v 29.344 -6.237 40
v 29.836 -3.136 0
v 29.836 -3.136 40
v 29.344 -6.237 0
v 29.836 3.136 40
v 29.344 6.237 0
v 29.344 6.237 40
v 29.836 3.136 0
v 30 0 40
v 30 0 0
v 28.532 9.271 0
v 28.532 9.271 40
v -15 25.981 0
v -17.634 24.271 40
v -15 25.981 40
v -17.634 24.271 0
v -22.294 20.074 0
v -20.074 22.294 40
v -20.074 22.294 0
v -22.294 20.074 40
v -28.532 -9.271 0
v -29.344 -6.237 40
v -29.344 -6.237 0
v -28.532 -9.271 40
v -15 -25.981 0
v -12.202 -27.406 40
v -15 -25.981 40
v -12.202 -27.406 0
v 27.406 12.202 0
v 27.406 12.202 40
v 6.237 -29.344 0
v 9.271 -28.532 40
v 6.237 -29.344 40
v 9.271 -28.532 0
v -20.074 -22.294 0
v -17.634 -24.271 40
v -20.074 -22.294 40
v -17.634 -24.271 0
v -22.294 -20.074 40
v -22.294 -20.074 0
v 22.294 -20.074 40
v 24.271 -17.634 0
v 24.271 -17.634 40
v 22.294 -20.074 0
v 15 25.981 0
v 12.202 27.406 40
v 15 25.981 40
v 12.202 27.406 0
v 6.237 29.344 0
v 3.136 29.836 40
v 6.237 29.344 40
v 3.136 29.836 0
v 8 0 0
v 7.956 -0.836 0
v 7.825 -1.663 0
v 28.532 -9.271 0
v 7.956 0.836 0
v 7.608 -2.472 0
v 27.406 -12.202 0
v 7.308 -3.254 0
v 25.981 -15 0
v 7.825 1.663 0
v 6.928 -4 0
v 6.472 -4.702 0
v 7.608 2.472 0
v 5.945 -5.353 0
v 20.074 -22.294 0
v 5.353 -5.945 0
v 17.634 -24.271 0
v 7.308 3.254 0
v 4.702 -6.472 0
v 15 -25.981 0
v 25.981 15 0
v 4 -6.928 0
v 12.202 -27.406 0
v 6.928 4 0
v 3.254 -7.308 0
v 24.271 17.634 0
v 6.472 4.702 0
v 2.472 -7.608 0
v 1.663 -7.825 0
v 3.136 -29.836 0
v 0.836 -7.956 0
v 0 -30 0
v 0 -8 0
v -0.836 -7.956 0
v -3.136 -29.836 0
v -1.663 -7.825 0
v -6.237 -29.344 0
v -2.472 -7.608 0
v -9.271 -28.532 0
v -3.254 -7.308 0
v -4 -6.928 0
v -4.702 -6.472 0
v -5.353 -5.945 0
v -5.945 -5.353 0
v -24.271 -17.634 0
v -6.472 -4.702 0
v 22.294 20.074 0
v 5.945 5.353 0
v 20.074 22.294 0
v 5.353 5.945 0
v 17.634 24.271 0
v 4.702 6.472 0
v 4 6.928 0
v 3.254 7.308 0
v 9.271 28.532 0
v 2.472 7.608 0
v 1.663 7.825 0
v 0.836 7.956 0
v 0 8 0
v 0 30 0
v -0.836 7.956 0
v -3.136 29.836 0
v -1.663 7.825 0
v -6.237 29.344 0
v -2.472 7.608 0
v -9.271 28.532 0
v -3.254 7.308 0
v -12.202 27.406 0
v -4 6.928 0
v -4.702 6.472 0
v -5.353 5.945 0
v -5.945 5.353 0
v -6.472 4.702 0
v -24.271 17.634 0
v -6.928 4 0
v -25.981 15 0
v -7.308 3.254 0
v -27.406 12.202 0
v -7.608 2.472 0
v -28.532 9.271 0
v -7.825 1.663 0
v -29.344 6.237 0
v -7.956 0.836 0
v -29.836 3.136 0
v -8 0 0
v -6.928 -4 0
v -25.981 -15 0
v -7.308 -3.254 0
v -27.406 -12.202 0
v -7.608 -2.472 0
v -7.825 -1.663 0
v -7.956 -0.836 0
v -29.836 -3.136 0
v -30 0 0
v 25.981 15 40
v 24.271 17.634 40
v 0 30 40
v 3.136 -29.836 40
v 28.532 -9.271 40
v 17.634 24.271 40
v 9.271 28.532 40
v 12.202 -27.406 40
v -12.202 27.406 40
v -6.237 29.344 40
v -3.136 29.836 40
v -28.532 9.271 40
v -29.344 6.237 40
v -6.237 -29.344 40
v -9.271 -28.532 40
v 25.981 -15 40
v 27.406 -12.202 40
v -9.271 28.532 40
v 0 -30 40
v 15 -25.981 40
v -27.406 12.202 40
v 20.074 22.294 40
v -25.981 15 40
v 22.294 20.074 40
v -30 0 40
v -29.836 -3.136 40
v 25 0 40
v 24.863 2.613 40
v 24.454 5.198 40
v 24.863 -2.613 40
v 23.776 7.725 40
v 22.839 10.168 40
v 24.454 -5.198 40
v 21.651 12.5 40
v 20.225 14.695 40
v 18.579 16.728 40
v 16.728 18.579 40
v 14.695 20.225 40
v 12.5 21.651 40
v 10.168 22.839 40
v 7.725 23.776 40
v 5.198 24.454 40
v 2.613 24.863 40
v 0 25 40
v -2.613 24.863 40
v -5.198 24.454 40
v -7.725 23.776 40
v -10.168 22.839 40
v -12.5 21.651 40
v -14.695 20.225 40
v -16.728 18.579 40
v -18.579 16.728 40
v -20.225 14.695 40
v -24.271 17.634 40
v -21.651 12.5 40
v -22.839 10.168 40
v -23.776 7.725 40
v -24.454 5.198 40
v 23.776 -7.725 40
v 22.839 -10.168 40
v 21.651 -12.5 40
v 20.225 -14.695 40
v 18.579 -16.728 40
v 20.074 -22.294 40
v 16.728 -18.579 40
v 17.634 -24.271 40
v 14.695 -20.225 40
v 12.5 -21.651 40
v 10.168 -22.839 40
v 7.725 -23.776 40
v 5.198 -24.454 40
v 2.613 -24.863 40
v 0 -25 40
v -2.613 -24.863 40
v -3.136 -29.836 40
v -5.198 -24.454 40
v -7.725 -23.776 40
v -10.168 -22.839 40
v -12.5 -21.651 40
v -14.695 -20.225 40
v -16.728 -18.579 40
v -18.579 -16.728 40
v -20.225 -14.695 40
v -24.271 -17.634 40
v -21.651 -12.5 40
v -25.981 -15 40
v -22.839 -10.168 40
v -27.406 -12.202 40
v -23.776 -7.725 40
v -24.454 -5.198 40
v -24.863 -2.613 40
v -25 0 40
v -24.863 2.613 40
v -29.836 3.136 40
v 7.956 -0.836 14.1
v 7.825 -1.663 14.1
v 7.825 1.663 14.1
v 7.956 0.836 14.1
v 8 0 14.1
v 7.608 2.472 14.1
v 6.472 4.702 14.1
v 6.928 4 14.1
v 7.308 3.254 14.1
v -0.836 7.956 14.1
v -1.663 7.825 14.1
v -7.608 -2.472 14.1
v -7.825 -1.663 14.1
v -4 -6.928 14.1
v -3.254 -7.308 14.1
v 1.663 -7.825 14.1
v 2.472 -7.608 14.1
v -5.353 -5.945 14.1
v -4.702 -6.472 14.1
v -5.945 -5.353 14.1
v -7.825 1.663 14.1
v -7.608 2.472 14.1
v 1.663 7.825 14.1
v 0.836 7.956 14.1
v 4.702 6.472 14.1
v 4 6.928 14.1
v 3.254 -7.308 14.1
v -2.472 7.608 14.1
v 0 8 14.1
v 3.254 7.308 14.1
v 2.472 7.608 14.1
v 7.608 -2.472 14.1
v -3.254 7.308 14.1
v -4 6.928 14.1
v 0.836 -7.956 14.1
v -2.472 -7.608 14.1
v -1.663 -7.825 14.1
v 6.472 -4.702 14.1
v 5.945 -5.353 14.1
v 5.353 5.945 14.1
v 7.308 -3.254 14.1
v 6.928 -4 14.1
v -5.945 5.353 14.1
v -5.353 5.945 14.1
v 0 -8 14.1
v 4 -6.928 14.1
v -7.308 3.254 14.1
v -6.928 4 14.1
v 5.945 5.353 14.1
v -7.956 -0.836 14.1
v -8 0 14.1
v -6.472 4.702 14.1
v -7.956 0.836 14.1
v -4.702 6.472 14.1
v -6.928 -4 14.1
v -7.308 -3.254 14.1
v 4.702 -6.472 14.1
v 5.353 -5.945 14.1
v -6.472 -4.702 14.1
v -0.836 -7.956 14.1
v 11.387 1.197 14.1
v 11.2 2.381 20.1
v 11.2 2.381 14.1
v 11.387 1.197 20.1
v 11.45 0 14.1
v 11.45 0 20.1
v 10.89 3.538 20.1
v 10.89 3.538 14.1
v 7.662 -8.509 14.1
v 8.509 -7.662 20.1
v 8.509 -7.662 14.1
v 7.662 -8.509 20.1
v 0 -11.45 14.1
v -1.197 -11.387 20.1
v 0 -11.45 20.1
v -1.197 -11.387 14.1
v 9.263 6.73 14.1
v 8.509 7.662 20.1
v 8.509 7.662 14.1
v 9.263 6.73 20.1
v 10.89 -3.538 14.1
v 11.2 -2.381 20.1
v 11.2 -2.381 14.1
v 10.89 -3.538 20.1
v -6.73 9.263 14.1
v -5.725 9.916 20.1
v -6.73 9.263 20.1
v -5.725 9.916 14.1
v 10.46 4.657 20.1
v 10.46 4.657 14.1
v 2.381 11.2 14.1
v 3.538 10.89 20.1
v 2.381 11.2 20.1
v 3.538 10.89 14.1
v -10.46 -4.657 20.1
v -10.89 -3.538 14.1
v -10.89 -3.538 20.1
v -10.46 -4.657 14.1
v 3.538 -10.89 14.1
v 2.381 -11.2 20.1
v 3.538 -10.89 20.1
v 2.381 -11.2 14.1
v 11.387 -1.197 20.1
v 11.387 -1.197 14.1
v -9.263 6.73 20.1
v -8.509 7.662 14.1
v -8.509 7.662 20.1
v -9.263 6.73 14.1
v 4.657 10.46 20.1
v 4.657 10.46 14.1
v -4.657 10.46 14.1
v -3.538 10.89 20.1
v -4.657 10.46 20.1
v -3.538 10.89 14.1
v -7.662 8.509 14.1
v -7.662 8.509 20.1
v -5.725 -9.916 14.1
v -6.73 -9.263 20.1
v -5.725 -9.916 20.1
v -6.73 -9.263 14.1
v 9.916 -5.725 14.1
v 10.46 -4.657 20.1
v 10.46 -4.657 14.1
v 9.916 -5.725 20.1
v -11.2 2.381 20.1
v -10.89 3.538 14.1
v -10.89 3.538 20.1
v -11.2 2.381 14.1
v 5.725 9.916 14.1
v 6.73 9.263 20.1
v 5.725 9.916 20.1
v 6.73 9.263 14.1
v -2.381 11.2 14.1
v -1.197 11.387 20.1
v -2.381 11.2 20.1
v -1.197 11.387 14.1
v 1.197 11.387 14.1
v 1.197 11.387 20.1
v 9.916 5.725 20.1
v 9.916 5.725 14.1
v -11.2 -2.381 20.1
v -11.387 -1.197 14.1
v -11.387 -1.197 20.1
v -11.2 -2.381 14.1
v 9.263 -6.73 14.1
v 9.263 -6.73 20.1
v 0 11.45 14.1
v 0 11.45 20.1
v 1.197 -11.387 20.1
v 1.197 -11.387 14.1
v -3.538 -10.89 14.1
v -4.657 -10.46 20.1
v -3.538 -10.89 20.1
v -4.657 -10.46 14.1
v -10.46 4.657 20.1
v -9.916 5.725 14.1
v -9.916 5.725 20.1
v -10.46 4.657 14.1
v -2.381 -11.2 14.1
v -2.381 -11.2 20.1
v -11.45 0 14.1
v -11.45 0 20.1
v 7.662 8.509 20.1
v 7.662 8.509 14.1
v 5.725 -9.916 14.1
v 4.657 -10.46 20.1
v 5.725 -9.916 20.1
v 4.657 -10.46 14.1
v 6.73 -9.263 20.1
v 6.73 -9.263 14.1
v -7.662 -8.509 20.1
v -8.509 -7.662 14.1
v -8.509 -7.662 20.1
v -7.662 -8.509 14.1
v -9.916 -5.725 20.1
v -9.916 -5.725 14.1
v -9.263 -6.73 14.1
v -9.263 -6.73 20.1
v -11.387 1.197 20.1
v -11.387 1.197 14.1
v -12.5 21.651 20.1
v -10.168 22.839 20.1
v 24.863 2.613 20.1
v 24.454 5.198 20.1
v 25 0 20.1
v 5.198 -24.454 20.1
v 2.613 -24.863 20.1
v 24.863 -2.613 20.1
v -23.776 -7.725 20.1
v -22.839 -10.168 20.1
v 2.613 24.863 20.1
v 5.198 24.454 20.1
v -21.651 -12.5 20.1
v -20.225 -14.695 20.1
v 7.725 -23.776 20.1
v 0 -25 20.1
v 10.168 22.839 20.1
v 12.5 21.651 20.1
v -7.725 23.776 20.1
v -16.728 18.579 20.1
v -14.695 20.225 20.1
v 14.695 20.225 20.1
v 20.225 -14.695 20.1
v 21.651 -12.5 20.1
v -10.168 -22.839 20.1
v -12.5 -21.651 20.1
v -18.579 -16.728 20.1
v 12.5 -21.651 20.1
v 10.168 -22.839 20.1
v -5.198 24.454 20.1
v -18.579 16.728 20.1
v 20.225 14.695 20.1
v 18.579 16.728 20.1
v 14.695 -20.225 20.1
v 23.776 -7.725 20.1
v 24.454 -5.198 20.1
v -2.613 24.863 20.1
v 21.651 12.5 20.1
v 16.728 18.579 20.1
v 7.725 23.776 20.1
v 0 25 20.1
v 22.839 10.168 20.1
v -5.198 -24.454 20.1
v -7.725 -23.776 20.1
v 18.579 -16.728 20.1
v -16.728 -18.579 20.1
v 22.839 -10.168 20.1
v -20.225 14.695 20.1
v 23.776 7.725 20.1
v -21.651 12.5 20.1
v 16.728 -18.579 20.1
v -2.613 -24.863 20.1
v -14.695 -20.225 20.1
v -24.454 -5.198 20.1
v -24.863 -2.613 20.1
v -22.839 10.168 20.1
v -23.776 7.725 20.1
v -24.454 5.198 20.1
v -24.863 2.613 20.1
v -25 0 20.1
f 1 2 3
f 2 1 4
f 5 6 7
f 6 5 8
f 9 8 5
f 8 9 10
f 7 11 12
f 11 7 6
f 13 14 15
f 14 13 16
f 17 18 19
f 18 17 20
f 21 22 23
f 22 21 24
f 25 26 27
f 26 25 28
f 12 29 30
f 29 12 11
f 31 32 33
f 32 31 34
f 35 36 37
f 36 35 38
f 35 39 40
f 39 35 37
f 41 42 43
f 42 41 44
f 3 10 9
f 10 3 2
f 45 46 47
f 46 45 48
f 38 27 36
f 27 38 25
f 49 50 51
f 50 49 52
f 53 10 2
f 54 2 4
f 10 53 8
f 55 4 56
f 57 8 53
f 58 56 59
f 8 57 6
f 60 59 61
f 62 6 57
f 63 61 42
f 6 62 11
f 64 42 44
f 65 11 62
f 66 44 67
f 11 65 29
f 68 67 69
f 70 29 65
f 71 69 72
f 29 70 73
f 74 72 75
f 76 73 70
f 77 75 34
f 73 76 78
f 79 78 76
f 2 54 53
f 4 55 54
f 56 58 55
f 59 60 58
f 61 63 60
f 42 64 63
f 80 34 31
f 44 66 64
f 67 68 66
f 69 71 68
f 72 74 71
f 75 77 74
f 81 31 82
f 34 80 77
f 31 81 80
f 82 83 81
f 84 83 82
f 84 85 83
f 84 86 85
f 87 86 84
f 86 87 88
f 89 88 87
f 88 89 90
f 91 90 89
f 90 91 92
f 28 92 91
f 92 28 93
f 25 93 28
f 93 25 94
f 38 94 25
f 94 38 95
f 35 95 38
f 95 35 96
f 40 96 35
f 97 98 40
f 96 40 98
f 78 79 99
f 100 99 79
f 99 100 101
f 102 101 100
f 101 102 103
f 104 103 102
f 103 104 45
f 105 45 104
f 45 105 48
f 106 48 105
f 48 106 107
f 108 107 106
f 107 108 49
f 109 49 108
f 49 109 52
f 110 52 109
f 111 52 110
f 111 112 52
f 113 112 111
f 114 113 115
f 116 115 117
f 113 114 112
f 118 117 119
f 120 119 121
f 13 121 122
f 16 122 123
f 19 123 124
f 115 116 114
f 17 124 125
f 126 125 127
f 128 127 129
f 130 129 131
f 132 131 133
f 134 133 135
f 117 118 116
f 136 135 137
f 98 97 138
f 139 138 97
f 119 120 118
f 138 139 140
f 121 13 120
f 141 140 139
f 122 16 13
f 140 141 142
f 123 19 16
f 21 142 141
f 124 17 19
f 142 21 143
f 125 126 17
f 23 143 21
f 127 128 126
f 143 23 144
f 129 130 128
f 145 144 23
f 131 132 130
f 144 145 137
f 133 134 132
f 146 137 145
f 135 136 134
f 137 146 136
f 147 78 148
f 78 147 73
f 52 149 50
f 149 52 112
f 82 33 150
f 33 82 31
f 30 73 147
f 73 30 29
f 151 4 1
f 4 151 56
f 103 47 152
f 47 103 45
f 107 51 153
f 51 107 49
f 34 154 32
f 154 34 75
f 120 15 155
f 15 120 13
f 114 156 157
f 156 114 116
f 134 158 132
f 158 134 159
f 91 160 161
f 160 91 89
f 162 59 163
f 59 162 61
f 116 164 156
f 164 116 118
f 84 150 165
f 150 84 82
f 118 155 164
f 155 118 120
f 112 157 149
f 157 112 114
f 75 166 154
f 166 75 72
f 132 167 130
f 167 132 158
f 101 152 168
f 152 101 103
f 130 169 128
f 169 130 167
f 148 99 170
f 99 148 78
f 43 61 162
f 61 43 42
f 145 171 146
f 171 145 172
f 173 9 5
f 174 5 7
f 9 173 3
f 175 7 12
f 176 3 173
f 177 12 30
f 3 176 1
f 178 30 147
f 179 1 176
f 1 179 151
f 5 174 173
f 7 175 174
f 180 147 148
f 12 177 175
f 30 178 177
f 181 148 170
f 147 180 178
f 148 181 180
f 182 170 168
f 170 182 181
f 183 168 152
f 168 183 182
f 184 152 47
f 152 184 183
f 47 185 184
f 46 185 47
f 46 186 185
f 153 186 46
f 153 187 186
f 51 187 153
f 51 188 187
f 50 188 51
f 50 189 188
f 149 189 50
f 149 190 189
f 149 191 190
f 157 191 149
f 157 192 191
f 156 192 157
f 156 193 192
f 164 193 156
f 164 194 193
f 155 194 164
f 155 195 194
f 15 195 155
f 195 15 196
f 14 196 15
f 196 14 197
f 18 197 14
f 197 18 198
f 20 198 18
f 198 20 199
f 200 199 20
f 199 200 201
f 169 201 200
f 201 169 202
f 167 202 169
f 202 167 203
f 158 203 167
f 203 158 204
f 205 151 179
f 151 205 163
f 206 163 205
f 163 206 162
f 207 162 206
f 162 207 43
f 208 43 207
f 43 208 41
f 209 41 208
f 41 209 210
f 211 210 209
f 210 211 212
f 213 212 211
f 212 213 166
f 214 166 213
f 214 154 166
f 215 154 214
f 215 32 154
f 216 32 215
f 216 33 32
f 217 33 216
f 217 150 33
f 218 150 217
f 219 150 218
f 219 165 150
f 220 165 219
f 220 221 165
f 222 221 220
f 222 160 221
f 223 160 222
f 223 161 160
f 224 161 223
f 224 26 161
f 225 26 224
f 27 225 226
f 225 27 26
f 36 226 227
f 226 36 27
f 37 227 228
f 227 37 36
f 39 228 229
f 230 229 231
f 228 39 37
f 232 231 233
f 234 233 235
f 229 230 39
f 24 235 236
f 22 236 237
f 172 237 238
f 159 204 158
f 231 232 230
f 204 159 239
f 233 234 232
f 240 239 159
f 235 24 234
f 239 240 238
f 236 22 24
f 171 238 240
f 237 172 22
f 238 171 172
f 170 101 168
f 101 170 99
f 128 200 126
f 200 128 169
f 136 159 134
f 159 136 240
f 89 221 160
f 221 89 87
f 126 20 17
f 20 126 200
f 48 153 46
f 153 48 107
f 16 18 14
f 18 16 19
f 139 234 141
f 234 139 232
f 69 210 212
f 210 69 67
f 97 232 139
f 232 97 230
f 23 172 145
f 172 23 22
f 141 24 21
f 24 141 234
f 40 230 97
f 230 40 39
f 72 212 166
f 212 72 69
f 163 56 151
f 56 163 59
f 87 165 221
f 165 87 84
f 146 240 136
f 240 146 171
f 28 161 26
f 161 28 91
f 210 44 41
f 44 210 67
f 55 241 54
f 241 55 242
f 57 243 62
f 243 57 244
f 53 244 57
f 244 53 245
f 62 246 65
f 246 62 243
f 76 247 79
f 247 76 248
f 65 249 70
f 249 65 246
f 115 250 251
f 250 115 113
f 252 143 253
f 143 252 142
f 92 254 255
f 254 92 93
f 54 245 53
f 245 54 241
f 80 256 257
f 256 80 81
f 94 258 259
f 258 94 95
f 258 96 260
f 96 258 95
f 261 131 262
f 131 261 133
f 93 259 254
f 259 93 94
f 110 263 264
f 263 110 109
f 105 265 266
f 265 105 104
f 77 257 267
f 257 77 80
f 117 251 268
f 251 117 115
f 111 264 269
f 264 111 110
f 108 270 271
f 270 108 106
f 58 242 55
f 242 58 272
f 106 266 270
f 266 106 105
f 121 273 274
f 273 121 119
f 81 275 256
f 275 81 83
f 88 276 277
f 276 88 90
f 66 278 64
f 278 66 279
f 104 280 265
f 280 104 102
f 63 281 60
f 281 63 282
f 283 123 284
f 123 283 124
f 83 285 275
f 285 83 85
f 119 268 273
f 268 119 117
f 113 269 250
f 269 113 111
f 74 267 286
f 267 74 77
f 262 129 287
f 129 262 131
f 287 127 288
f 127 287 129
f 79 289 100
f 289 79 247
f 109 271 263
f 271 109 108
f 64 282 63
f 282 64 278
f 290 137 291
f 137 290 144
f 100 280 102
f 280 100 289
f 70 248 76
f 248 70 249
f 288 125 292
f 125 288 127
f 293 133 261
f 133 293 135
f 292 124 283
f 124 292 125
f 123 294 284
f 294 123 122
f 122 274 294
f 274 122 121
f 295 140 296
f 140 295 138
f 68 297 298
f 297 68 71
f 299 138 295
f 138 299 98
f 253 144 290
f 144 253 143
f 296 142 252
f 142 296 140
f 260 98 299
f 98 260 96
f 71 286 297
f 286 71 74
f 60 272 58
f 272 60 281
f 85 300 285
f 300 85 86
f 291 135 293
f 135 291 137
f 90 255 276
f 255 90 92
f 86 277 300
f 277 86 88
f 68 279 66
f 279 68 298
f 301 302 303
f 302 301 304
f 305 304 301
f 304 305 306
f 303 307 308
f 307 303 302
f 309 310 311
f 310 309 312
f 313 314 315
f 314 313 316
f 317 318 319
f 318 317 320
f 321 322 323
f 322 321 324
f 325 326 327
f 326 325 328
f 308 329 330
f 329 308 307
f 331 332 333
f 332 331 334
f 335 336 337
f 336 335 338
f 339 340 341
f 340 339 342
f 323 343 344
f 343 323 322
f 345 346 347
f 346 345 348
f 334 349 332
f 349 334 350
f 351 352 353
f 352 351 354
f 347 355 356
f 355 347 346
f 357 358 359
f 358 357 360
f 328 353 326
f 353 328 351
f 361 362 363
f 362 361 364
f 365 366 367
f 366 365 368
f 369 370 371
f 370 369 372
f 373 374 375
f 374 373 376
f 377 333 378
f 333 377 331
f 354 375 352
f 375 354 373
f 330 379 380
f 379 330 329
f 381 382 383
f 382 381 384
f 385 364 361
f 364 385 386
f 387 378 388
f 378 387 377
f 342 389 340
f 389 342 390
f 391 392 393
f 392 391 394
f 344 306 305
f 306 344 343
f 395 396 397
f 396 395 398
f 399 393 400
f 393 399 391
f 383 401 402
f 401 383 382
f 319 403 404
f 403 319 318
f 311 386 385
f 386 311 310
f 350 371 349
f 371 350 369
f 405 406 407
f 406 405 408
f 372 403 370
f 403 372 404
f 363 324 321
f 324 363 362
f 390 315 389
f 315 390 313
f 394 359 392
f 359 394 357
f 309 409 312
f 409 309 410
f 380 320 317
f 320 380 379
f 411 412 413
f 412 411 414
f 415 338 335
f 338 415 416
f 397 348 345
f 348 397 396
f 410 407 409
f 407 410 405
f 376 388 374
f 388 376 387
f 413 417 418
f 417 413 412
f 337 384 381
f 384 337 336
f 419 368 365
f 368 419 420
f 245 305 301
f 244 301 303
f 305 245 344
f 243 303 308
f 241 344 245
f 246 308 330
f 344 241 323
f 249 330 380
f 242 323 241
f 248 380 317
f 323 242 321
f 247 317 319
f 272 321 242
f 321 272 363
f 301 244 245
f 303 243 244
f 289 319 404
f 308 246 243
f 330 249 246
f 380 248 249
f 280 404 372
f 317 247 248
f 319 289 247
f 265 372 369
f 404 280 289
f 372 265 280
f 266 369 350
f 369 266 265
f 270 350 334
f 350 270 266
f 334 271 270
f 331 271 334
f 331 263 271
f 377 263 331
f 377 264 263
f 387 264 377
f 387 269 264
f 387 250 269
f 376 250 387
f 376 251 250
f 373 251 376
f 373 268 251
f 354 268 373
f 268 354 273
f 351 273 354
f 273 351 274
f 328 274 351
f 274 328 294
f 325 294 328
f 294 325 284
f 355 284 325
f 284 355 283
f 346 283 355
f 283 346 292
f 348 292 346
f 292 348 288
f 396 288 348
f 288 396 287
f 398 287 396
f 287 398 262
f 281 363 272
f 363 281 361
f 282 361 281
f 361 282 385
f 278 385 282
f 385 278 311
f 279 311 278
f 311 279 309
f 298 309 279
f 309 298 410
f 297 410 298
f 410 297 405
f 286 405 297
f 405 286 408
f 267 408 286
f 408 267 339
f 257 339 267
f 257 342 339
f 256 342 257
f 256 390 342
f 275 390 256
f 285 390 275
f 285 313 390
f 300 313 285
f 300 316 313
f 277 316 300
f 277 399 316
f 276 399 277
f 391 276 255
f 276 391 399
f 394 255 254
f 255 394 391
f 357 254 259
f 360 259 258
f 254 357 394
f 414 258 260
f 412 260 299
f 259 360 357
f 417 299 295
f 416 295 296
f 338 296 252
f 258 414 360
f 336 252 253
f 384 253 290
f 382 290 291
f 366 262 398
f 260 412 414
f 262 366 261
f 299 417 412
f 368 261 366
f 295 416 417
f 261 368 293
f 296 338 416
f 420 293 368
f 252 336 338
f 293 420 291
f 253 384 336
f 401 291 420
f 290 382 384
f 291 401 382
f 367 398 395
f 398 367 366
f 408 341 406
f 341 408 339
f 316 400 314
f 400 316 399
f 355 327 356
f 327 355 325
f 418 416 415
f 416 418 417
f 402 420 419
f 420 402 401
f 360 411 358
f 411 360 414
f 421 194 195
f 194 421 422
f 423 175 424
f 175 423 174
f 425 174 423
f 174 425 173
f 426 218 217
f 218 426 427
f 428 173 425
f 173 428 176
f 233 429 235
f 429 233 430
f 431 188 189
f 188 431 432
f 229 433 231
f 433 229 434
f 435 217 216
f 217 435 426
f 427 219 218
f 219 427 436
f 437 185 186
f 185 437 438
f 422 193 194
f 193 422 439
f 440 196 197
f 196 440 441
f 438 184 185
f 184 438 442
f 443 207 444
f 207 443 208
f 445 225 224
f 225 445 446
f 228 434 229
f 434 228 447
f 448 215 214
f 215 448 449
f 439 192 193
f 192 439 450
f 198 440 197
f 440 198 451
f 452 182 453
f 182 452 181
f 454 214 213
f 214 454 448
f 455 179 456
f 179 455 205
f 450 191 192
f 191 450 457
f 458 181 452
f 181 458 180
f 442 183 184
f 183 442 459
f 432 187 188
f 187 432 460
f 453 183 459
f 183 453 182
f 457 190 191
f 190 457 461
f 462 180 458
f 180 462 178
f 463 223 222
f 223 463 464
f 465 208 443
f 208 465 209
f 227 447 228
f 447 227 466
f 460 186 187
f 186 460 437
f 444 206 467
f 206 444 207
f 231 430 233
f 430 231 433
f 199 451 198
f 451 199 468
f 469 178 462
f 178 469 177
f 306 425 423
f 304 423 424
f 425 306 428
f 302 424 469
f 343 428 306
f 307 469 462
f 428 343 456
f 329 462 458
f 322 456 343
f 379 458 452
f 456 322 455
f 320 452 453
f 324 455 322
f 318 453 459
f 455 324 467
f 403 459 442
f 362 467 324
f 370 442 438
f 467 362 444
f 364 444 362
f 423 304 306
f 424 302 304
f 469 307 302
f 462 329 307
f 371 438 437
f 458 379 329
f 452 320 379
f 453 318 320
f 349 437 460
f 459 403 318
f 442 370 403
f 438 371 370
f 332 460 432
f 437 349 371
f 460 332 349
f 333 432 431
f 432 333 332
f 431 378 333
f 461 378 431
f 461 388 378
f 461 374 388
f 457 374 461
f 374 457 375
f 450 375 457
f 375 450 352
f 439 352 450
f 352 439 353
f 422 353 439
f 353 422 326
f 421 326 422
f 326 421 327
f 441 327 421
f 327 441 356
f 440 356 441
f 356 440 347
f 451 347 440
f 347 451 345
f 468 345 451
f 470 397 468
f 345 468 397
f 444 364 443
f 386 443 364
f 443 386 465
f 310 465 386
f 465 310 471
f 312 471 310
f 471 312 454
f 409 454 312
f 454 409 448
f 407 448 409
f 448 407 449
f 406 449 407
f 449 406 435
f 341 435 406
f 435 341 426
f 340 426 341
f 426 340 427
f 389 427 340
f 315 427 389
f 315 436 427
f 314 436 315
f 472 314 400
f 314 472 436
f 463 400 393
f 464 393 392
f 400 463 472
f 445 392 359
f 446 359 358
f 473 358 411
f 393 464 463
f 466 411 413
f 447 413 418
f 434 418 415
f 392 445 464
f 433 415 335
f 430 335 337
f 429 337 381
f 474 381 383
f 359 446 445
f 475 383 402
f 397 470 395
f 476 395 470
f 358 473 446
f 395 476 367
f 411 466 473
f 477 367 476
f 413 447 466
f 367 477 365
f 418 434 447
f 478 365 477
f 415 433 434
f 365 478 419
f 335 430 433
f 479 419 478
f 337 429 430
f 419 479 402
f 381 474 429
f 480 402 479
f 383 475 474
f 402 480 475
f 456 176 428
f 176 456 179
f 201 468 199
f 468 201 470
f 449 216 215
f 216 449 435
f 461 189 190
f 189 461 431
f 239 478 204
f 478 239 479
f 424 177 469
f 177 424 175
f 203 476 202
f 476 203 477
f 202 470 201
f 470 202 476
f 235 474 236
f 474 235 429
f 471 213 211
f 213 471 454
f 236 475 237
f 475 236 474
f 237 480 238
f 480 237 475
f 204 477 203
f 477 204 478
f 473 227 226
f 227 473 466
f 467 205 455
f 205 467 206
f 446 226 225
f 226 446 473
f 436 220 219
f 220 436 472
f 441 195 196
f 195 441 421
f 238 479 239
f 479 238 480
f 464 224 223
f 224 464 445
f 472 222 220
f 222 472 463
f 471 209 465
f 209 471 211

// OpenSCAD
Diametre_bobine_en_mm = 60 ; 
Largeur_bobine_en_mm = 40 ; 
Epaisseur_de_la_paroi_en_mm = 5 ; 
Facette = 60 ;


$fn=Facette;
exterieur = Diametre_bobine_en_mm / 2 ; 

difference(){

cylinder ( h=Largeur_bobine_en_mm, r=exterieur ); // exterieur 
cylinder ( h=100, r=8 ); // intérieur
translate ([0,0,14.1]) cylinder ( h=100, r=11.45 ); // logement roulement
translate ([0,0,20.1]) cylinder ( h=Largeur_bobine_en_mm + 300, r=exterieur - Epaisseur_de_la_paroi_en_mm ); 
 
}
